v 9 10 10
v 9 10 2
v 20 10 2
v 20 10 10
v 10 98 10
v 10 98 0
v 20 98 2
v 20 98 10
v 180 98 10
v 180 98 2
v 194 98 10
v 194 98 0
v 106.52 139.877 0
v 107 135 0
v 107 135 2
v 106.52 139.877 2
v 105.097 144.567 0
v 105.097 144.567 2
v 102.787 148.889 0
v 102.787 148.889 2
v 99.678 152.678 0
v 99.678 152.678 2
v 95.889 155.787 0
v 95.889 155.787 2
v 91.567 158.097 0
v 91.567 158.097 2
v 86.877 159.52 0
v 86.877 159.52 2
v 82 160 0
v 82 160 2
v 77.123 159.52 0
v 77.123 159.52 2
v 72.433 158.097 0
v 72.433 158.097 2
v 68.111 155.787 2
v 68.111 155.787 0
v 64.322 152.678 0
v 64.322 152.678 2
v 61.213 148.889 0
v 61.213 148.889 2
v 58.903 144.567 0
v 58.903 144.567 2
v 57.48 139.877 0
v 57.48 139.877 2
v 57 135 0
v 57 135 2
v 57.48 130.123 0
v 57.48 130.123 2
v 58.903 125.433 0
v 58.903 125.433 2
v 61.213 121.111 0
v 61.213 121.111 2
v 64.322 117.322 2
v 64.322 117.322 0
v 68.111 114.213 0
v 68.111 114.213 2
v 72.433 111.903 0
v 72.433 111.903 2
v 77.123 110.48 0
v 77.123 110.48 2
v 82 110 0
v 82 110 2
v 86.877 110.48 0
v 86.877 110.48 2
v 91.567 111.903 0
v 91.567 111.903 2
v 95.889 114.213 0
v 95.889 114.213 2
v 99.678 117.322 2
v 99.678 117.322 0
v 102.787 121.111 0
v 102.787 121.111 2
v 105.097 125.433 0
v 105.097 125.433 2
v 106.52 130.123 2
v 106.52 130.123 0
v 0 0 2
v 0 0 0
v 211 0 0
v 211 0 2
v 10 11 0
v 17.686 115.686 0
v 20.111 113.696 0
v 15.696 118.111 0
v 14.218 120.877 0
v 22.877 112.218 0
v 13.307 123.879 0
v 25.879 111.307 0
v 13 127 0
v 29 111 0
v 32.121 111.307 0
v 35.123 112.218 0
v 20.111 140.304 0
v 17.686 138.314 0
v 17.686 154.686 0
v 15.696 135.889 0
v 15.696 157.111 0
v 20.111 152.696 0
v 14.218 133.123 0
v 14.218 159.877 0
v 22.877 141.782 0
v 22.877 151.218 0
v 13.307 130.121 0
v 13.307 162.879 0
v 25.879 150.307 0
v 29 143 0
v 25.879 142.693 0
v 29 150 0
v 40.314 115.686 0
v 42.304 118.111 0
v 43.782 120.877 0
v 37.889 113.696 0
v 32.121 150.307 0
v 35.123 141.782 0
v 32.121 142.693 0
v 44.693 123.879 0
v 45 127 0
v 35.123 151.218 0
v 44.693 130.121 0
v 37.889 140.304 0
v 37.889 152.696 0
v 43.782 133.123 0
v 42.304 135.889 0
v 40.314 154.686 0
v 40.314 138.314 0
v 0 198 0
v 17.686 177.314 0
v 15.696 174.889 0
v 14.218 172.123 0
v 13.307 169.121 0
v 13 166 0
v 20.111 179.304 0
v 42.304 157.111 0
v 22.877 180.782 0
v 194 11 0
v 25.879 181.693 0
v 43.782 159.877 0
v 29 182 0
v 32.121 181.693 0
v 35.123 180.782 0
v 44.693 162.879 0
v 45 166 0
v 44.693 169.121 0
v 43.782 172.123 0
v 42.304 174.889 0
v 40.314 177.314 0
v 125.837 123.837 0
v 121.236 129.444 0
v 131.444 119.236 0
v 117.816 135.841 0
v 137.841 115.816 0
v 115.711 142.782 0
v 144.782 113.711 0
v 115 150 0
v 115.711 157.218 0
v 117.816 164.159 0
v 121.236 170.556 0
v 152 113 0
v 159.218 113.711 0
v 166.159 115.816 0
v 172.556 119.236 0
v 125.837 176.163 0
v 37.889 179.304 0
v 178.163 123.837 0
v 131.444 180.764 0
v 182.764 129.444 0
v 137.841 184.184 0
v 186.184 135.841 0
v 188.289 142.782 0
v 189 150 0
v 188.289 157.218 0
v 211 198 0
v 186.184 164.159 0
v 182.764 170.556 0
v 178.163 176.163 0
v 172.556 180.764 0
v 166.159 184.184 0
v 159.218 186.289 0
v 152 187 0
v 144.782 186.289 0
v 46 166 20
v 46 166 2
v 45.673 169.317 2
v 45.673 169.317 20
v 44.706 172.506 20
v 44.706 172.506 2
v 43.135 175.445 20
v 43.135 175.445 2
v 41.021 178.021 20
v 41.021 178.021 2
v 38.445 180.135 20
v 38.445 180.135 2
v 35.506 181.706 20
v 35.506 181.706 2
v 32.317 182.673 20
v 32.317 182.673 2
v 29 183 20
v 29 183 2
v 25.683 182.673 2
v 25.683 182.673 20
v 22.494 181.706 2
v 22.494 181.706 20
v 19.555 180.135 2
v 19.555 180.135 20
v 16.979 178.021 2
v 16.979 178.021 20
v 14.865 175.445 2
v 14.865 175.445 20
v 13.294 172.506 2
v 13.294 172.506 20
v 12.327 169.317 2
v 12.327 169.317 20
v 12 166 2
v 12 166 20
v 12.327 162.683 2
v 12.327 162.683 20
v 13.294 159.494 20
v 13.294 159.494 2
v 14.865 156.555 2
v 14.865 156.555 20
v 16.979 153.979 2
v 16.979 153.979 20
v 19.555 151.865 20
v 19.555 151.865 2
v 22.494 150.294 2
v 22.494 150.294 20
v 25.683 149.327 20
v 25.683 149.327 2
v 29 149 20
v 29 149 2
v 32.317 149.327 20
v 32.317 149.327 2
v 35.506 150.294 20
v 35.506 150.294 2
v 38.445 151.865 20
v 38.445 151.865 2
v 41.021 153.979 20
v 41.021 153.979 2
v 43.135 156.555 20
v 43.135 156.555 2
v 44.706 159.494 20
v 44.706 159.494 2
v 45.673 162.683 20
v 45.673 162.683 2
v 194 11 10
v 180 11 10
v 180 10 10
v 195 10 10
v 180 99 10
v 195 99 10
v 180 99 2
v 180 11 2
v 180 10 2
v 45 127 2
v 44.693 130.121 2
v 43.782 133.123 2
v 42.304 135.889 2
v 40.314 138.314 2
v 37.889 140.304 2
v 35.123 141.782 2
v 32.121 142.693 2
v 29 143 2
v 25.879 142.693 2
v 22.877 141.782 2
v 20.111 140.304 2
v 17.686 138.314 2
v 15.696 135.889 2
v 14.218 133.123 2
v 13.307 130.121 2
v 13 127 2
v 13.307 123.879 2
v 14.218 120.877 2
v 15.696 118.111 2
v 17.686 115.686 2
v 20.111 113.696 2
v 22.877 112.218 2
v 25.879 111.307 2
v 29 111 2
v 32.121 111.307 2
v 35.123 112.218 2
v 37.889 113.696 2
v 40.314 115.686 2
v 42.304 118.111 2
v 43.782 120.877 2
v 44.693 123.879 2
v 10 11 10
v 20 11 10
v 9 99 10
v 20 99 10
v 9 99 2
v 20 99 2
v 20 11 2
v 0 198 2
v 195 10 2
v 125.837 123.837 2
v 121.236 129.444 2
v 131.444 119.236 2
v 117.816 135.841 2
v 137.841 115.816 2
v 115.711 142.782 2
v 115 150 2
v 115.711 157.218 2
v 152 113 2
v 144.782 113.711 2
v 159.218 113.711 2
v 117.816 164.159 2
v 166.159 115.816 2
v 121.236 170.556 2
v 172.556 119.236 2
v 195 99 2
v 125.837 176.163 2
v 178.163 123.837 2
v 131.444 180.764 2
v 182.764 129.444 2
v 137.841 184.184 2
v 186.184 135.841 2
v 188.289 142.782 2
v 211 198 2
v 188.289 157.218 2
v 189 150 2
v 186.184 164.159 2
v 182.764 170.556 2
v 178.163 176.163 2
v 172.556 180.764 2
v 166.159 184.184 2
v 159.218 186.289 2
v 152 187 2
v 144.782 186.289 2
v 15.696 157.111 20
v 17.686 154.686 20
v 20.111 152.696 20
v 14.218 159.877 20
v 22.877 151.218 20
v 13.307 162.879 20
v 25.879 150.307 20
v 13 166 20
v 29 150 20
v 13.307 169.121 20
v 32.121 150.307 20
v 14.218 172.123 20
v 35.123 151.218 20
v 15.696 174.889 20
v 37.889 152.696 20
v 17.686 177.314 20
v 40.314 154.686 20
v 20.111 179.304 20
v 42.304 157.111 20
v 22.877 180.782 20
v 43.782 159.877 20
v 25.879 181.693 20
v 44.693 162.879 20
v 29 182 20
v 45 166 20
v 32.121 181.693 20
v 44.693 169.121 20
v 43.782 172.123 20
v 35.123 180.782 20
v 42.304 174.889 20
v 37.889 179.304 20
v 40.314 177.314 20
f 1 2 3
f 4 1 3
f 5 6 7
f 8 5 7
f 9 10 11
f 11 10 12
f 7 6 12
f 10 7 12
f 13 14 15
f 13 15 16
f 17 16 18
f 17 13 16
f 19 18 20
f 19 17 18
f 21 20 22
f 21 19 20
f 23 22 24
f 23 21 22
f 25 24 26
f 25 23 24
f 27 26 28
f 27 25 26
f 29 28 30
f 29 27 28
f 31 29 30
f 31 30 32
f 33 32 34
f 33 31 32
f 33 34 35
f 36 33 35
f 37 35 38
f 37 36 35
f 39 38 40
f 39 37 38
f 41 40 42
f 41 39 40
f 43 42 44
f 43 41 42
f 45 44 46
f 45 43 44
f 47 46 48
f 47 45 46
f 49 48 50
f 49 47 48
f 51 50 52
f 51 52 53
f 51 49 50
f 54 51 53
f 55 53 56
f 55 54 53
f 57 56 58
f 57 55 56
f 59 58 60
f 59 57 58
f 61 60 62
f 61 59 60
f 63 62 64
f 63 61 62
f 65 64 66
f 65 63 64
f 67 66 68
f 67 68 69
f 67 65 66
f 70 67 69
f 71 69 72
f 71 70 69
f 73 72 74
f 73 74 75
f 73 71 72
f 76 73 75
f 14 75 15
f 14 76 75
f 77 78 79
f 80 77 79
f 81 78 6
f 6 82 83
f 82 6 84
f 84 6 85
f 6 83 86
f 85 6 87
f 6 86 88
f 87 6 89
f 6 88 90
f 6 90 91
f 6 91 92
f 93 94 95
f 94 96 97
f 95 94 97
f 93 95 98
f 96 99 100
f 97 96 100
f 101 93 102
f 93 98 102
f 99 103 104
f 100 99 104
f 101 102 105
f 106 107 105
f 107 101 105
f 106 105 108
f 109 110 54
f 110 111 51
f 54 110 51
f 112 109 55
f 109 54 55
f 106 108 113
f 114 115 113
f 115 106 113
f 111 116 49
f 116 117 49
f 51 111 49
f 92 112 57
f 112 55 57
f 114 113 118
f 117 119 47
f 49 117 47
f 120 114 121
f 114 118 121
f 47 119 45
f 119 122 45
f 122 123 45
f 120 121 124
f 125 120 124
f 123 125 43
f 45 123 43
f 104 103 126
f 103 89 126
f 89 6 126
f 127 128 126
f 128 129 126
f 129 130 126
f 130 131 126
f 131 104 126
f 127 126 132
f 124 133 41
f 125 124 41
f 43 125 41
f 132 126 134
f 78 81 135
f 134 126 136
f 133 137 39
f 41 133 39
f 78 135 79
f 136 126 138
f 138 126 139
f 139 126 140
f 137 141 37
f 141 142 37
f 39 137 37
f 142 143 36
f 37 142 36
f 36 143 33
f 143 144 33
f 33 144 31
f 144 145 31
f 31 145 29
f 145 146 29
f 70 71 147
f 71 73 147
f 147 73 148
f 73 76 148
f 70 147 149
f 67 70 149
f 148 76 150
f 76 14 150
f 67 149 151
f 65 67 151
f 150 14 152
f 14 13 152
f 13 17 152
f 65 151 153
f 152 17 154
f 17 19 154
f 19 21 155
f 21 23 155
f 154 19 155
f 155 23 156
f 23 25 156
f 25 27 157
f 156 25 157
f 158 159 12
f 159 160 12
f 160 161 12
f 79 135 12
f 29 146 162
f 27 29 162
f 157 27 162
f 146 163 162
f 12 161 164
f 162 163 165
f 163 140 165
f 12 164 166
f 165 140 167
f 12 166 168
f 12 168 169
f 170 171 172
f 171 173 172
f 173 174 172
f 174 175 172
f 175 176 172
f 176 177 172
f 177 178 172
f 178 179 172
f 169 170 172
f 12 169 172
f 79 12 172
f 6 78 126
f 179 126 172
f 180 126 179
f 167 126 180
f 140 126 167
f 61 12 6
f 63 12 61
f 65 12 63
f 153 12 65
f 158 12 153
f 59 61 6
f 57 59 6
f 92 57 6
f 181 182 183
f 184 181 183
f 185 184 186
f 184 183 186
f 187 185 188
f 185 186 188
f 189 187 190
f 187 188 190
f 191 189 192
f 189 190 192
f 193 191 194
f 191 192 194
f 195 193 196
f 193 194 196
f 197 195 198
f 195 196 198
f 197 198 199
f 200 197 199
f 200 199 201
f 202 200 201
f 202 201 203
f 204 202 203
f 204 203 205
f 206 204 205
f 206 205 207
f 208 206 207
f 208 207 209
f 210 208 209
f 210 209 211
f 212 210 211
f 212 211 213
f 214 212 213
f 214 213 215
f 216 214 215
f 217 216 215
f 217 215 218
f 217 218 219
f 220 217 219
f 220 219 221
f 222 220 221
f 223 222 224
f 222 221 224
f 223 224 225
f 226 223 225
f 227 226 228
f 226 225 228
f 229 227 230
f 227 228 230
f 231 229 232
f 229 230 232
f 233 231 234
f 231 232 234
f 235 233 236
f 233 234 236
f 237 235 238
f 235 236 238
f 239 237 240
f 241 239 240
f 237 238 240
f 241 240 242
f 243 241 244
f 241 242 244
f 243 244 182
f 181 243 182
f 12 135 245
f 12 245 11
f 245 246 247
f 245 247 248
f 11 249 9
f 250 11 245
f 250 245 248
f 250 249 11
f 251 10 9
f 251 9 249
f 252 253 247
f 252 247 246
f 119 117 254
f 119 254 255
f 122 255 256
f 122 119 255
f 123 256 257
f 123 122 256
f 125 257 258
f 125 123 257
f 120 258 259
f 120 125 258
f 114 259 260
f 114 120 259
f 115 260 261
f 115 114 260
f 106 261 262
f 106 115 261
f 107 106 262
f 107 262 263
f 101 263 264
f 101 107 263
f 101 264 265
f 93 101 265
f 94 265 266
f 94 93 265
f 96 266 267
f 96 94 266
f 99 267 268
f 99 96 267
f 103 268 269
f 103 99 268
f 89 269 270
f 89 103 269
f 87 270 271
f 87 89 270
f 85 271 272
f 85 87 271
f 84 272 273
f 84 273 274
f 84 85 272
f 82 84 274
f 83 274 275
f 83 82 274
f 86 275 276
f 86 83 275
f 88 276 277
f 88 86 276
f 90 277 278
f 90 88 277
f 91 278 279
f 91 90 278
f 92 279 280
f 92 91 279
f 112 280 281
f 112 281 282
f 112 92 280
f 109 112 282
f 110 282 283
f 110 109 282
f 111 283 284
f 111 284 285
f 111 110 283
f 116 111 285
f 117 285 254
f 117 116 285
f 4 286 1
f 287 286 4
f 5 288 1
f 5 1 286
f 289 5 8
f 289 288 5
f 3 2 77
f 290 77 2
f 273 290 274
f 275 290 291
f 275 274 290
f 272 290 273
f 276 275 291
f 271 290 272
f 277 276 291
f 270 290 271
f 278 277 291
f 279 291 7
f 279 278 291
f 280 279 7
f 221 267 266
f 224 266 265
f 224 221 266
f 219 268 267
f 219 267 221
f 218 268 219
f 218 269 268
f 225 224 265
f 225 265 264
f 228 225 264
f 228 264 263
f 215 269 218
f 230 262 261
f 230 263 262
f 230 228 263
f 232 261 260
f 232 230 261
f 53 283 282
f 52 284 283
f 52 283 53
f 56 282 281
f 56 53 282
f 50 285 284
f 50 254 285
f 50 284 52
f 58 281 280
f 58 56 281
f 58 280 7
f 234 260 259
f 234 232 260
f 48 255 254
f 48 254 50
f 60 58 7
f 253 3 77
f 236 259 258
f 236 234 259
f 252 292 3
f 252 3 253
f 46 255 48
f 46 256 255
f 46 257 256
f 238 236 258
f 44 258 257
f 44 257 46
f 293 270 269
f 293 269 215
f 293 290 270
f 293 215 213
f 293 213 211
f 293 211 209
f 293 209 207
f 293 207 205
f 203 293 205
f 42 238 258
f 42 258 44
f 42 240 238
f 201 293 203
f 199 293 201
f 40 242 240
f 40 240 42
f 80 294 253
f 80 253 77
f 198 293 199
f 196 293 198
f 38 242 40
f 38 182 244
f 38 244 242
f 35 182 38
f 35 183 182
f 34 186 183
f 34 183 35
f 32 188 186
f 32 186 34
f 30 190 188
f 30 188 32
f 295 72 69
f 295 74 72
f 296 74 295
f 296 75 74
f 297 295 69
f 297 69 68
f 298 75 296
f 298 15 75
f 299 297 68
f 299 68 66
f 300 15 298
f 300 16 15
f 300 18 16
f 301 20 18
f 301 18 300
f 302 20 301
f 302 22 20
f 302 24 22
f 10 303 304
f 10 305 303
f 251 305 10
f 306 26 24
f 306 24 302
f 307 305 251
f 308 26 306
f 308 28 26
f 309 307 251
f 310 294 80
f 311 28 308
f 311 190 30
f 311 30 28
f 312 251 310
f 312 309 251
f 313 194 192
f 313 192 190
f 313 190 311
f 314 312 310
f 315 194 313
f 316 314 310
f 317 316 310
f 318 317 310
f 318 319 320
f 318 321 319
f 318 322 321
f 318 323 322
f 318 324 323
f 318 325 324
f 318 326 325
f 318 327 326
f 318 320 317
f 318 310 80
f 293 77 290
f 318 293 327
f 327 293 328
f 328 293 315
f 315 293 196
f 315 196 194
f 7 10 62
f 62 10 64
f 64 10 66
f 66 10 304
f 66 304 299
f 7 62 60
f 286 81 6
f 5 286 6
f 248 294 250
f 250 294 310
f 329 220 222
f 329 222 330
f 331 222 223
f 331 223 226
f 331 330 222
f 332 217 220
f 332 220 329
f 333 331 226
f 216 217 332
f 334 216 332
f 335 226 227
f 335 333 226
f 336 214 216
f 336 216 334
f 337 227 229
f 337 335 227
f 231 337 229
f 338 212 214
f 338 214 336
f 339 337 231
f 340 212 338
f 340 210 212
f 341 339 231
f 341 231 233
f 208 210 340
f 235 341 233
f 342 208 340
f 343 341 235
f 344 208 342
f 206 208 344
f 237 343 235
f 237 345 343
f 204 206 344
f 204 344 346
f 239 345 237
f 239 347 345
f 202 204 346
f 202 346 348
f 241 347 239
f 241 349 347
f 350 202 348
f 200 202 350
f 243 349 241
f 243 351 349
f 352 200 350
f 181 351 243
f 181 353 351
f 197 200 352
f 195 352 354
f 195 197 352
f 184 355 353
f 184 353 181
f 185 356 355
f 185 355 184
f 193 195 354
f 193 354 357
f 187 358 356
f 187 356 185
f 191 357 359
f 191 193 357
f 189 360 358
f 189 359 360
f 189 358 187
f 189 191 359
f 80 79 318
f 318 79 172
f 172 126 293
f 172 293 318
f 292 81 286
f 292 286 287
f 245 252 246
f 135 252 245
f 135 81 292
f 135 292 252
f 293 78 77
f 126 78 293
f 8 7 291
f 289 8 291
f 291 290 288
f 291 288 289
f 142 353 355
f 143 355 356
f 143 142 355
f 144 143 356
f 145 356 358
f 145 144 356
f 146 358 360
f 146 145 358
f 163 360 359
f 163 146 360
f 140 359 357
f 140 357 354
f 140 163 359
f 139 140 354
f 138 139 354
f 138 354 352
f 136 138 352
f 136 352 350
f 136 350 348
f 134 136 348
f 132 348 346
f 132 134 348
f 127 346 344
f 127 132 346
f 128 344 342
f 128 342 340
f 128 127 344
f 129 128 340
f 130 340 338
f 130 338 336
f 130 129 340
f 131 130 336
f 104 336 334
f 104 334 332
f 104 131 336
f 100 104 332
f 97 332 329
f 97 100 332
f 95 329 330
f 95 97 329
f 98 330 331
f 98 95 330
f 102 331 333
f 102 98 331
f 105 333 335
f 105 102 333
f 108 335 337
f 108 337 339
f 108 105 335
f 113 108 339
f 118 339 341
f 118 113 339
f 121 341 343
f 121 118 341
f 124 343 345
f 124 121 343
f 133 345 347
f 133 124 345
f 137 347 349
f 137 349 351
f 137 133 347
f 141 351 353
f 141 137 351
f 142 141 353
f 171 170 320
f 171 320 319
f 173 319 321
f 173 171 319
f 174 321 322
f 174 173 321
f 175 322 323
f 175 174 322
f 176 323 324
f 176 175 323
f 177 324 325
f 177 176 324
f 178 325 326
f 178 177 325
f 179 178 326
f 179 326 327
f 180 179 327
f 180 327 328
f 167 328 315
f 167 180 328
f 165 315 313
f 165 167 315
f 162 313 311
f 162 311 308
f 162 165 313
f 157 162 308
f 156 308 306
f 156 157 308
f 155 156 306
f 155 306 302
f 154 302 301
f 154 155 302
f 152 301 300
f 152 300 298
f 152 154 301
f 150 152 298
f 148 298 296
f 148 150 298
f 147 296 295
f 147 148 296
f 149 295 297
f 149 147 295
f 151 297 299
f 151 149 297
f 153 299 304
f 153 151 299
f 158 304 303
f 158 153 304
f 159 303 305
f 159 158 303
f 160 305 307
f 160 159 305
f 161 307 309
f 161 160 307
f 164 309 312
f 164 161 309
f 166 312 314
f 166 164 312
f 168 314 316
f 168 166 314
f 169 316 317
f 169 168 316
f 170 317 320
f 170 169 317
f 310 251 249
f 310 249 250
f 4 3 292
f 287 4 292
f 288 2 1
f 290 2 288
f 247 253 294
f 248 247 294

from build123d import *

# Parameters (mm, degrees)
BOX_W             = 211
BOX_H             = 198
BOX_DEPTH         = 2
BOX001_W          = 186
BOX001_H          = 89
BOX001_DEPTH      = 10
BOX002_W          = 184
BOX002_H          = 87
BOX002_DEPTH      = 10
BOX003_W          = 160
BOX003_H          = 89
BOX003_DEPTH      = 10
CYLINDER_R        = 16
CYLINDER_DEPTH    = 2
CYLINDER001_R     = 25
CYLINDER001_DEPTH = 2
CYLINDER002_R     = 17
CYLINDER002_DEPTH = 20
CYLINDER003_R     = 16
CYLINDER003_DEPTH = 20
CYLINDER004_R     = 37
CYLINDER004_DEPTH = 2


with BuildPart() as part:
    # Box → Box (join)
    with BuildSketch(Plane.XY):
        with Locations((105.5, 99)):
            Rectangle(BOX_W, BOX_H)
    extrude(amount=BOX_DEPTH)

    # Box001 → Box001 (join)
    with BuildSketch(Plane(origin=(9, 10, 0), x_dir=(1, 0, 0), z_dir=(0, 0, 1))):
        with Locations((93, 44.5)):
            Rectangle(BOX001_W, BOX001_H)
    extrude(amount=BOX001_DEPTH)

    # Box002 → Box002 (cut)
    with BuildSketch(Plane(origin=(10, 11, 0), x_dir=(1, 0, 0), z_dir=(0, 0, 1))):
        with Locations((92, 43.5)):
            Rectangle(BOX002_W, BOX002_H)
    extrude(amount=BOX002_DEPTH, mode=Mode.SUBTRACT)

    # Box003 → Box003 (cut)
    with BuildSketch(Plane(origin=(20, 10, 2), x_dir=(1, 0, 0), z_dir=(0, 0, 1))):
        with Locations((80, 44.5)):
            Rectangle(BOX003_W, BOX003_H)
    extrude(amount=BOX003_DEPTH, mode=Mode.SUBTRACT)

    # Cylinder → Cylinder (cut)
    with BuildSketch(Plane(origin=(29, 127, 0), x_dir=(1, 0, 0), z_dir=(0, 0, 1))):
        Circle(CYLINDER_R)
    extrude(amount=CYLINDER_DEPTH, mode=Mode.SUBTRACT)

    # Cylinder001 → Cylinder001 (cut)
    with BuildSketch(Plane(origin=(82, 135, 0), x_dir=(1, 0, 0), z_dir=(0, 0, 1))):
        Circle(CYLINDER001_R)
    extrude(amount=CYLINDER001_DEPTH, mode=Mode.SUBTRACT)

    # Cylinder002 → Cylinder002 (join)
    with BuildSketch(Plane(origin=(29, 166, 0), x_dir=(1, 0, 0), z_dir=(0, 0, 1))):
        Circle(CYLINDER002_R)
    extrude(amount=CYLINDER002_DEPTH)

    # Cylinder003 → Cylinder003 (cut)
    with BuildSketch(Plane(origin=(29, 166, 0), x_dir=(1, 0, 0), z_dir=(0, 0, 1))):
        Circle(CYLINDER003_R)
    extrude(amount=CYLINDER003_DEPTH, mode=Mode.SUBTRACT)

    # Cylinder004 → Cylinder004 (cut)
    with BuildSketch(Plane(origin=(152, 150, 0), x_dir=(1, 0, 0), z_dir=(0, 0, 1))):
        Circle(CYLINDER004_R)
    extrude(amount=CYLINDER004_DEPTH, mode=Mode.SUBTRACT)


solid = part.part
